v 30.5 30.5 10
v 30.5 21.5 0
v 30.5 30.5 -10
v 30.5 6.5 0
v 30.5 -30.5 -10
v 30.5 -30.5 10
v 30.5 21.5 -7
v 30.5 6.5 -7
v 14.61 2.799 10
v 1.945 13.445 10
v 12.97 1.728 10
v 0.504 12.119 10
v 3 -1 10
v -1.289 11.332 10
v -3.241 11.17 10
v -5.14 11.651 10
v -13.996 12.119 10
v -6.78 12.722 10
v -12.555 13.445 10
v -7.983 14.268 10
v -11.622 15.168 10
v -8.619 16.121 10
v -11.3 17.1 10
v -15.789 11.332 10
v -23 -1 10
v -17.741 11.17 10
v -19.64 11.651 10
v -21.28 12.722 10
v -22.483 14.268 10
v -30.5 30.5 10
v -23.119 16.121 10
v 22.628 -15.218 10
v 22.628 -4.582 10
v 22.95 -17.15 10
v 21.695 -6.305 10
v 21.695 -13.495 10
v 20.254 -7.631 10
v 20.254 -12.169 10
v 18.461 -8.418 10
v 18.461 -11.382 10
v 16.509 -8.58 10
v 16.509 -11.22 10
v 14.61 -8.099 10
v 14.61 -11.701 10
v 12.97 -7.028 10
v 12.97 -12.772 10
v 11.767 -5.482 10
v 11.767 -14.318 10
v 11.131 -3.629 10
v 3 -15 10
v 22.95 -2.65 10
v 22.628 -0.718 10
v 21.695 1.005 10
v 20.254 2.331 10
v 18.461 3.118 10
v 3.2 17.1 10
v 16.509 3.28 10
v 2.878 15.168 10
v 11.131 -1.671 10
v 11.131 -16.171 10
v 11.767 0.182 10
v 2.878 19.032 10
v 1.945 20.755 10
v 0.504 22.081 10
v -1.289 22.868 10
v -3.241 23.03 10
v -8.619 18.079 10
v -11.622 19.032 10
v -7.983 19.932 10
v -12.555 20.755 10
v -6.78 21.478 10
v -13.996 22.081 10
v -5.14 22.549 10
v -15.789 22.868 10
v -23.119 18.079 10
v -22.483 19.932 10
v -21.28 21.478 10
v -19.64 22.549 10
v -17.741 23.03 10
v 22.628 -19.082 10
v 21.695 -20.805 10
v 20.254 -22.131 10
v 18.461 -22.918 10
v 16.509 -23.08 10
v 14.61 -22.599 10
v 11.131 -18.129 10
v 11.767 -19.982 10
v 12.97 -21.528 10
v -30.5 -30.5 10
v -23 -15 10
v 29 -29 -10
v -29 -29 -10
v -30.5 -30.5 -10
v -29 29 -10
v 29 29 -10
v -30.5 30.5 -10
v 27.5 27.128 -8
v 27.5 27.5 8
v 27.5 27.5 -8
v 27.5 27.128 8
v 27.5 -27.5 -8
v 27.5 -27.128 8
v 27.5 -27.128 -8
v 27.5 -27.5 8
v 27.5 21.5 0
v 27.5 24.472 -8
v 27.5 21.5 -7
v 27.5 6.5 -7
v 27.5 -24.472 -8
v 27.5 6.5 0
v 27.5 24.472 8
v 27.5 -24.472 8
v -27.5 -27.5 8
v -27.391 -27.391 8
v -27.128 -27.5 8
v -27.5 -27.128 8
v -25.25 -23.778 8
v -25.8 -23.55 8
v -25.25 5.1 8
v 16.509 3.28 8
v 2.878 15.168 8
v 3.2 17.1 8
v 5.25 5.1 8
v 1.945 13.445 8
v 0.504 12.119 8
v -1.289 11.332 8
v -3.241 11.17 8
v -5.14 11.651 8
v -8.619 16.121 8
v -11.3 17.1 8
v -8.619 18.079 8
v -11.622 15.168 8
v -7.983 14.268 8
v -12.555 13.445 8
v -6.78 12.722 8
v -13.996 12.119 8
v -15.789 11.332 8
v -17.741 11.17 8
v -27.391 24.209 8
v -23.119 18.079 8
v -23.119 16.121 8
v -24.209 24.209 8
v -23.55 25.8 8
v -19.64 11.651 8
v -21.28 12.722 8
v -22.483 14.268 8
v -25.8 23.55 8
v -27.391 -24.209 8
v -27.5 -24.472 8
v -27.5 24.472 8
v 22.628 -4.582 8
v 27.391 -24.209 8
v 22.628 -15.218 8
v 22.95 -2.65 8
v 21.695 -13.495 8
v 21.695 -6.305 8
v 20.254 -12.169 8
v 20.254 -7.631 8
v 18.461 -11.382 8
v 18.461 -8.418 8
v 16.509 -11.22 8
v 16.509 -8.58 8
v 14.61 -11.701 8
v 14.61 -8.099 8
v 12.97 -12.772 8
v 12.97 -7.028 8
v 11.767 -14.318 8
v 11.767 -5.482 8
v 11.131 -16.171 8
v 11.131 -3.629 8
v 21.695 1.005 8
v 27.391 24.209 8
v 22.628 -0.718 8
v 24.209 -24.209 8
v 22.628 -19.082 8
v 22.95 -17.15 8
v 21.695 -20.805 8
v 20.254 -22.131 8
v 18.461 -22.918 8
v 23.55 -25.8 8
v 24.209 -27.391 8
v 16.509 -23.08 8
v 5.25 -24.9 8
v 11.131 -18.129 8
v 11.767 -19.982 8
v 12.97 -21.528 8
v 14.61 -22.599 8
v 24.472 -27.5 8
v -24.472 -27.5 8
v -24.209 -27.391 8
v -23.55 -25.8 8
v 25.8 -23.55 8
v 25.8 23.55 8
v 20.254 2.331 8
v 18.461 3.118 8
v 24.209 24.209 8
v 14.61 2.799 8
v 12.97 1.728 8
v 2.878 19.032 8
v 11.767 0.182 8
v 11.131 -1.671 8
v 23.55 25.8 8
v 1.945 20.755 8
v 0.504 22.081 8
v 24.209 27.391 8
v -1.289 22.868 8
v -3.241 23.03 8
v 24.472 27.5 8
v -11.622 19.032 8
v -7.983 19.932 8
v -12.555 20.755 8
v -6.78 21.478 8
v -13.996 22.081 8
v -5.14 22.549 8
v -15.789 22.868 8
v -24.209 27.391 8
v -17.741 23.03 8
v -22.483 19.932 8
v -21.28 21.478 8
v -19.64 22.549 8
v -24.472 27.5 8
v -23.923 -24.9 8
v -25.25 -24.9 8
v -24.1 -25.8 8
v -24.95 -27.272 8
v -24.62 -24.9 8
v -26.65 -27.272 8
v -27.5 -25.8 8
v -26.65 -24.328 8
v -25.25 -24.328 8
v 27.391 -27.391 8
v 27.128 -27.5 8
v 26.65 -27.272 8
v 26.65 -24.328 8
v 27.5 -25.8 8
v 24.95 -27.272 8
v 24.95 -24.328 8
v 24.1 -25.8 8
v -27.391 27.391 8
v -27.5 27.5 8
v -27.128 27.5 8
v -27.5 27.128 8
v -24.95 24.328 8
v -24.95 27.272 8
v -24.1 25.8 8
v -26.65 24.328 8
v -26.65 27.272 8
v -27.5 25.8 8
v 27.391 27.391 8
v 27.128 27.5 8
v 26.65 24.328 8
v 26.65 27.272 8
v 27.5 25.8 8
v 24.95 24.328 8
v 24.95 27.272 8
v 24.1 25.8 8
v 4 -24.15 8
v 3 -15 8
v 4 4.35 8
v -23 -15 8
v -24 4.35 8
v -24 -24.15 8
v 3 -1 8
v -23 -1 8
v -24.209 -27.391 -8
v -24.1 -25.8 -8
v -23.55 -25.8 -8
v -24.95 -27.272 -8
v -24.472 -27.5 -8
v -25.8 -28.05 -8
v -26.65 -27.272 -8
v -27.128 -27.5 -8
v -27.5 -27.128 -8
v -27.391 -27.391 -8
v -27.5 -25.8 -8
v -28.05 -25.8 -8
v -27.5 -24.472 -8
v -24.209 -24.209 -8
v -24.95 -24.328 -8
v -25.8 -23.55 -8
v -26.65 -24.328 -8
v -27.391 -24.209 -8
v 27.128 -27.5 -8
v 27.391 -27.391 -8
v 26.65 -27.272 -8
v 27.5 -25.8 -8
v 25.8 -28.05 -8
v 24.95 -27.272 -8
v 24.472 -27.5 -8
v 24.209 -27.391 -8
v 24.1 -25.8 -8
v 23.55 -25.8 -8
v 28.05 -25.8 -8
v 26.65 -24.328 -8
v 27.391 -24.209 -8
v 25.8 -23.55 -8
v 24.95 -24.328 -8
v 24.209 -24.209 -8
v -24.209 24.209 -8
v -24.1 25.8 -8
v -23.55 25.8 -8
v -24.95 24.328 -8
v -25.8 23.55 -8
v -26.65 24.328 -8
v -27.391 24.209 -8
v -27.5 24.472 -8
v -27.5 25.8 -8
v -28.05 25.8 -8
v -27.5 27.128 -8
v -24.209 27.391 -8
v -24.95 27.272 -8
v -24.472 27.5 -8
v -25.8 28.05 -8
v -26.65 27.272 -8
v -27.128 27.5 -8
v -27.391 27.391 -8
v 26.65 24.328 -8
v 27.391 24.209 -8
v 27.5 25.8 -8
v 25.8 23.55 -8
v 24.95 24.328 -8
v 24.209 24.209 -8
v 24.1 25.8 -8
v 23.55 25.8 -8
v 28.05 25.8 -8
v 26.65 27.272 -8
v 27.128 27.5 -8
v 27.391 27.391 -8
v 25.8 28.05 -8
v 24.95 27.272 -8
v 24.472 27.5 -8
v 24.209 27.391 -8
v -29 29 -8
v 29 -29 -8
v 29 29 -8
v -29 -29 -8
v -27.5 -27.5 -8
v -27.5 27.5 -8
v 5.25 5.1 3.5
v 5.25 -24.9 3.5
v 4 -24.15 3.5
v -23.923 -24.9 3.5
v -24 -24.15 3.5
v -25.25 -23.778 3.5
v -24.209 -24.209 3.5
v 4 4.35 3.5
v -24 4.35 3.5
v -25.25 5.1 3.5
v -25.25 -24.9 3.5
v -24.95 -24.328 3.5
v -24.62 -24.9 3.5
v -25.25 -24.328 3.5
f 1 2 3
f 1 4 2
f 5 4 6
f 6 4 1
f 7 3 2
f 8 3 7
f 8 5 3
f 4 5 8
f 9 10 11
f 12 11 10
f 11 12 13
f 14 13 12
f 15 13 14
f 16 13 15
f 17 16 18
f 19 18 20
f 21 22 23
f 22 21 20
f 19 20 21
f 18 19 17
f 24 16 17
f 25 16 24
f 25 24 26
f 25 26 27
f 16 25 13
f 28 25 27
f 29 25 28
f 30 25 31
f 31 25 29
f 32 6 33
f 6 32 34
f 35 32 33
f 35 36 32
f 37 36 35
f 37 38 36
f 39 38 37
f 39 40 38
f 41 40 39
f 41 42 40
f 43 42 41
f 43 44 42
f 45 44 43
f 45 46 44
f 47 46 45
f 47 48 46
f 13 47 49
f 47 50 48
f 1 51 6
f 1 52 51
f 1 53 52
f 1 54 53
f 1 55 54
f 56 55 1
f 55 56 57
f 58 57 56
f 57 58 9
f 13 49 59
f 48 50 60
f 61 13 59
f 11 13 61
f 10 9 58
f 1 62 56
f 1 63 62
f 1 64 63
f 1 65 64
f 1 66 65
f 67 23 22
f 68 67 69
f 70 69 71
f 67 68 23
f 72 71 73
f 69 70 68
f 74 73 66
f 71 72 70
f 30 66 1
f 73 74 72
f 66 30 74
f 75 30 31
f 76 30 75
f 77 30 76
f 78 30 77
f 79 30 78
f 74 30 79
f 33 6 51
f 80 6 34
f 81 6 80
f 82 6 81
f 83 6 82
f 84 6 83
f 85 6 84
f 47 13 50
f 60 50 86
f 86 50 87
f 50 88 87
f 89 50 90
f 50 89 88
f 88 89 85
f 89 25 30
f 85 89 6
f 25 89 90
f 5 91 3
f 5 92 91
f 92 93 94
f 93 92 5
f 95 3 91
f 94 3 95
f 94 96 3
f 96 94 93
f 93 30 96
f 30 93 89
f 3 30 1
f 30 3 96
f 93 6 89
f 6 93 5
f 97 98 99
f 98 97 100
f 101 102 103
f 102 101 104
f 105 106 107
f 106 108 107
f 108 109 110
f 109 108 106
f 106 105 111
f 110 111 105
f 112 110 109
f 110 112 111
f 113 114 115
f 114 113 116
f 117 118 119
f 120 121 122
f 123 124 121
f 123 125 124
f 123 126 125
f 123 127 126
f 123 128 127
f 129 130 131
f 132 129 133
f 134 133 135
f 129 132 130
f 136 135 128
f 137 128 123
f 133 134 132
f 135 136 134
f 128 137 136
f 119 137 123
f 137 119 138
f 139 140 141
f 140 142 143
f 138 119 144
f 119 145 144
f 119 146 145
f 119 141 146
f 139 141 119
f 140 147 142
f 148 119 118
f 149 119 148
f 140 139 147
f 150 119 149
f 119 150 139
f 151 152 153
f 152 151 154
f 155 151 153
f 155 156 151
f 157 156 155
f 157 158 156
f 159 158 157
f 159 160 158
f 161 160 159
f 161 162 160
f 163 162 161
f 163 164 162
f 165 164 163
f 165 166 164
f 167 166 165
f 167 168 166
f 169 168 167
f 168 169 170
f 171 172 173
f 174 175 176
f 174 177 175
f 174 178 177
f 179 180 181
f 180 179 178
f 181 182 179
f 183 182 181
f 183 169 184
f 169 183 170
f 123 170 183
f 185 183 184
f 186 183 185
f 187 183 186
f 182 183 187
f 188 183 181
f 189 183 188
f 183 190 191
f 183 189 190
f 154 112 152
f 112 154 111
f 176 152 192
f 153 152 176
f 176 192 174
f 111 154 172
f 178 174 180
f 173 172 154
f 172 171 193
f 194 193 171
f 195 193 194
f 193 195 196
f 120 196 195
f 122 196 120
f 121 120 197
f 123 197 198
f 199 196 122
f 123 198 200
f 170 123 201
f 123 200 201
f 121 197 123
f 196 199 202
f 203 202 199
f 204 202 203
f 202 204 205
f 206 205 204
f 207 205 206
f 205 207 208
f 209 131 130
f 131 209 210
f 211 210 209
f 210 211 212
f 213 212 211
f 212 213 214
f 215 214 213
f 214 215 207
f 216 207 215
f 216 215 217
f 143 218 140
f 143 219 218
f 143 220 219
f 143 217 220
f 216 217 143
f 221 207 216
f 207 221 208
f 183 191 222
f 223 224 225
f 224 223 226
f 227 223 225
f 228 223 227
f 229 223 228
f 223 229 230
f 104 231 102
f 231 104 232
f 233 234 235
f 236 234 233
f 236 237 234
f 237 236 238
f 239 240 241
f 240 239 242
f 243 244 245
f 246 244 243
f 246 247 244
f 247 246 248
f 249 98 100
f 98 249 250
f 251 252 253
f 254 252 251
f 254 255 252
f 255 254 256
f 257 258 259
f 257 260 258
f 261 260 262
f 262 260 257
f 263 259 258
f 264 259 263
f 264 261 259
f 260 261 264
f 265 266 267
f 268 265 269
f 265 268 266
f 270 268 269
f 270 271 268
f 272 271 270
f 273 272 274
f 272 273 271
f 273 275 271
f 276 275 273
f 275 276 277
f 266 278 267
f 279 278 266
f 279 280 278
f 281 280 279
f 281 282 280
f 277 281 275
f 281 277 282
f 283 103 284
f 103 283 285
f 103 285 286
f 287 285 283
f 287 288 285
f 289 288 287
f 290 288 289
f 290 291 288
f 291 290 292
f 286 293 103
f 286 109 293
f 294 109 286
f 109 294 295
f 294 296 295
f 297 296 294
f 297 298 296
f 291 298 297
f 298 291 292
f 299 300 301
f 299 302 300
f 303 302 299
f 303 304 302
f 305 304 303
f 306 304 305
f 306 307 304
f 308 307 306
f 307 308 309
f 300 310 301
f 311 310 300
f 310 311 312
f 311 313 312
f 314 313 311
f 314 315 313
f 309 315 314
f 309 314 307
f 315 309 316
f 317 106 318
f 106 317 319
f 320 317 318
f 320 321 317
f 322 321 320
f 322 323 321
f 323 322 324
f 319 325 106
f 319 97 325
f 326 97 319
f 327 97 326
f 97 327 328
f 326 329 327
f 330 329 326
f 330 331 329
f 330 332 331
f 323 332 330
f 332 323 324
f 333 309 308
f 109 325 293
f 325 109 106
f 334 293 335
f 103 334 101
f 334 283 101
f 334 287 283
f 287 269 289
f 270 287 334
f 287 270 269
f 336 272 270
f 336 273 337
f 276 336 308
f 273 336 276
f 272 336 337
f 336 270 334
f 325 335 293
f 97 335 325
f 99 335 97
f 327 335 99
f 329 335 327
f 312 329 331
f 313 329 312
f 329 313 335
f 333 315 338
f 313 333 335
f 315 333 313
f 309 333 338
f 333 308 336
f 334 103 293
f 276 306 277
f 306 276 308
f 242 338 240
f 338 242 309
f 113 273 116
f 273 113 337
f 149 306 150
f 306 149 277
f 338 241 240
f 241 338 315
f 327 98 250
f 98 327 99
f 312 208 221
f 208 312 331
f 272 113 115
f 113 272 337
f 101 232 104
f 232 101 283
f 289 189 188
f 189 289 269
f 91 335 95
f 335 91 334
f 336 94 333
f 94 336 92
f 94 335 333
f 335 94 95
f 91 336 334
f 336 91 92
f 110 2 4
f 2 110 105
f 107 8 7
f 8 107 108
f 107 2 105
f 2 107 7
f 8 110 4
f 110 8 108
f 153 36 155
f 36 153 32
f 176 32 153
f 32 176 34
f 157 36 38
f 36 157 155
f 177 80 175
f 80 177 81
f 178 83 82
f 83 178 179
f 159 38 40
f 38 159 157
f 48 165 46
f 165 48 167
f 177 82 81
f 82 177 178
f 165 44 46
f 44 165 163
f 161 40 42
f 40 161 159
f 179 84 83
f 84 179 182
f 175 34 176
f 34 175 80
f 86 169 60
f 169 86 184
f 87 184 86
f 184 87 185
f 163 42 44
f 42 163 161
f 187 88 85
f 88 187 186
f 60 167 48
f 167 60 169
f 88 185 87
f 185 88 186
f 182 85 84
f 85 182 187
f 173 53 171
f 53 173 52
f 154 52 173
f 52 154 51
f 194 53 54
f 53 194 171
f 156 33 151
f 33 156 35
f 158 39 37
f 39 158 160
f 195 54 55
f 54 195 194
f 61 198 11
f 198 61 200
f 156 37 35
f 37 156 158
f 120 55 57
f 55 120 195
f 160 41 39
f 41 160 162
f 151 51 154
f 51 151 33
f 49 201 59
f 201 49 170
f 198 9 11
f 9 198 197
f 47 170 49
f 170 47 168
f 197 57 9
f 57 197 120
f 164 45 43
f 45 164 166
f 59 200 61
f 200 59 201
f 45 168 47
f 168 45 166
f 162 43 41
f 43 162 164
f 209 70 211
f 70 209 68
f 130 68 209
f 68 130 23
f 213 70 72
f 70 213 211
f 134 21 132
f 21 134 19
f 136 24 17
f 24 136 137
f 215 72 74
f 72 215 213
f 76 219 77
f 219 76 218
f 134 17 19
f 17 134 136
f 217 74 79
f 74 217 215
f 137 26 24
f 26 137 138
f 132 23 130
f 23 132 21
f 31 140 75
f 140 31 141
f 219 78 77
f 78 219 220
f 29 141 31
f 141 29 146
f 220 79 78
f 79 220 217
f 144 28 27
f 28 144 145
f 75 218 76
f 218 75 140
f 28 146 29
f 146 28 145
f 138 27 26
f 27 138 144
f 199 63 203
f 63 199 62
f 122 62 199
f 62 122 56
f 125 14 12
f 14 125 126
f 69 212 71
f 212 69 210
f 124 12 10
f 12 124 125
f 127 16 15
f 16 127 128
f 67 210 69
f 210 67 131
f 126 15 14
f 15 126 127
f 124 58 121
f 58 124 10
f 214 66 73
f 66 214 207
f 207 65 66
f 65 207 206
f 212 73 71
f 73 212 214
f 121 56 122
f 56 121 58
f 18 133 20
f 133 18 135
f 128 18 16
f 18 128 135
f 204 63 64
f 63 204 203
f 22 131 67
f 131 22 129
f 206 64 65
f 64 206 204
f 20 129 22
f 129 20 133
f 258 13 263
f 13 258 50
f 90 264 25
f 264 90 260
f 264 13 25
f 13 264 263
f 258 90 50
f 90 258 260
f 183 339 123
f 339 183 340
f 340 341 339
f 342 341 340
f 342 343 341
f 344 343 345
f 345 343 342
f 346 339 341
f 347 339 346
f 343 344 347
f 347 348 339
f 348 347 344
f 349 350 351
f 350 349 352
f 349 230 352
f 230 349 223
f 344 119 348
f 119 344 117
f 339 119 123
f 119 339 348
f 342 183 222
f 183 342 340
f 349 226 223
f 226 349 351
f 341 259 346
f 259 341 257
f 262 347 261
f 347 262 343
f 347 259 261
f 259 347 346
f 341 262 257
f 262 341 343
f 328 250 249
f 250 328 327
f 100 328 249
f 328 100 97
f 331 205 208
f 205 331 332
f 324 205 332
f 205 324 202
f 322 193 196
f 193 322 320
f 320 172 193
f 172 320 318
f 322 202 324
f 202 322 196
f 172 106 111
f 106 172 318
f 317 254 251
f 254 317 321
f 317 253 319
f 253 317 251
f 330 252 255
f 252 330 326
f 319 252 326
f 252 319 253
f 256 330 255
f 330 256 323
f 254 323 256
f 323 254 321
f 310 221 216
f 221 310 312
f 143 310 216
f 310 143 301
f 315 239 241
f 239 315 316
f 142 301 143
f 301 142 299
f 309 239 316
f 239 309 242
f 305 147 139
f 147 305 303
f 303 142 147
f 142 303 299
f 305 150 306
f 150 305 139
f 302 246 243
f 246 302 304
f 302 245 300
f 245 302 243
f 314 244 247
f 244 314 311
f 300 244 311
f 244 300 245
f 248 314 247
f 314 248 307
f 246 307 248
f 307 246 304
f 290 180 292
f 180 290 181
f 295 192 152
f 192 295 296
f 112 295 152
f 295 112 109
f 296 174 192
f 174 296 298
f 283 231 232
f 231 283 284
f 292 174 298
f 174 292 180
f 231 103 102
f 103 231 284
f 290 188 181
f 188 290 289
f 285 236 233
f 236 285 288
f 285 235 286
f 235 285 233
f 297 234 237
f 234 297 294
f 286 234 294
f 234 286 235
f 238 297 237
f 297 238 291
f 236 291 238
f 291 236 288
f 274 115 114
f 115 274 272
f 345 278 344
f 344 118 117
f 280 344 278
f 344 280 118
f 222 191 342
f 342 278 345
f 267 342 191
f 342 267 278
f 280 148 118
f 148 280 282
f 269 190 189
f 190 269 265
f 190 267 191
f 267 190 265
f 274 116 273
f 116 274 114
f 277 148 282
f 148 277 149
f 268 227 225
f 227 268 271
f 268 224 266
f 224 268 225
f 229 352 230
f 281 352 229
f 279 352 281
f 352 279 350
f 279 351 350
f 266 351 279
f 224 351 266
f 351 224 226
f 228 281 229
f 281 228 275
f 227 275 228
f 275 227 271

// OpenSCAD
union(){    
    difference(){
        cube([61, 61, 20], center = true); // Base Cube
        cube([55, 55, 16], center = true); // Hohlraum
        translate([0,0,-9])cube([58, 58, 2], center = true); //Untere Falz
        translate([29,14,-3.5])cube([3, 15, 7], center = true); // Kabelkanal
        translate([17.0, -17.15, 9])cylinder(h = 2, d = 11.9, center = true); // Button Minus
        translate([17.0, -2.65, 9])cylinder(h = 2, d = 11.9, center = true); // Button Plus
        translate([-17.25, 17.1, 9])cylinder(h = 2, d = 11.9, center = true); // Button Off
        translate([-2.75, 17.1, 9])cylinder(h = 2, d = 11.9, center = true); // Button Reset
        translate([-10, -8, 9])cube([26, 14, 2], center = true); //Display
    }
    
    //Rahmen Display
    difference(){
    translate([-10, -9.9, 6.5])cube([30.5, 30, 6], center=true);
    translate([-10, -9.9, 6.5])cube([28, 28.5, 6], center=true);
    }
    
    //Verschraubung
    difference(){
        translate([25.8, 25.8, 0])cylinder( h = 16, d = 4.5, center = true); // rechts oben
        translate([25.8, 25.8, 0])cylinder( h = 16, d = 3.4, center = true); // rechts oben
        
    }
    difference(){
        translate([-25.8, 25.8, 0])cylinder( h = 16, d = 4.5, center = true); // links oben
        translate([-25.8, 25.8, 0])cylinder( h = 16, d = 3.4, center = true); // links oben
    }
    difference(){
        translate([25.8, -25.8, 0])cylinder( h = 16, d = 4.5, center = true); // rechts unten
        translate([25.8, -25.8, 0])cylinder( h = 16, d = 3.4, center = true); // rechts unten
    }
    difference(){
        translate([-25.8, -25.8, 0])cylinder( h = 16, d = 4.5, center = true); // links unten
        translate([-25.8, -25.8, 0])cylinder( h = 16, d = 3.4, center = true); // links unten
    }
    
}
